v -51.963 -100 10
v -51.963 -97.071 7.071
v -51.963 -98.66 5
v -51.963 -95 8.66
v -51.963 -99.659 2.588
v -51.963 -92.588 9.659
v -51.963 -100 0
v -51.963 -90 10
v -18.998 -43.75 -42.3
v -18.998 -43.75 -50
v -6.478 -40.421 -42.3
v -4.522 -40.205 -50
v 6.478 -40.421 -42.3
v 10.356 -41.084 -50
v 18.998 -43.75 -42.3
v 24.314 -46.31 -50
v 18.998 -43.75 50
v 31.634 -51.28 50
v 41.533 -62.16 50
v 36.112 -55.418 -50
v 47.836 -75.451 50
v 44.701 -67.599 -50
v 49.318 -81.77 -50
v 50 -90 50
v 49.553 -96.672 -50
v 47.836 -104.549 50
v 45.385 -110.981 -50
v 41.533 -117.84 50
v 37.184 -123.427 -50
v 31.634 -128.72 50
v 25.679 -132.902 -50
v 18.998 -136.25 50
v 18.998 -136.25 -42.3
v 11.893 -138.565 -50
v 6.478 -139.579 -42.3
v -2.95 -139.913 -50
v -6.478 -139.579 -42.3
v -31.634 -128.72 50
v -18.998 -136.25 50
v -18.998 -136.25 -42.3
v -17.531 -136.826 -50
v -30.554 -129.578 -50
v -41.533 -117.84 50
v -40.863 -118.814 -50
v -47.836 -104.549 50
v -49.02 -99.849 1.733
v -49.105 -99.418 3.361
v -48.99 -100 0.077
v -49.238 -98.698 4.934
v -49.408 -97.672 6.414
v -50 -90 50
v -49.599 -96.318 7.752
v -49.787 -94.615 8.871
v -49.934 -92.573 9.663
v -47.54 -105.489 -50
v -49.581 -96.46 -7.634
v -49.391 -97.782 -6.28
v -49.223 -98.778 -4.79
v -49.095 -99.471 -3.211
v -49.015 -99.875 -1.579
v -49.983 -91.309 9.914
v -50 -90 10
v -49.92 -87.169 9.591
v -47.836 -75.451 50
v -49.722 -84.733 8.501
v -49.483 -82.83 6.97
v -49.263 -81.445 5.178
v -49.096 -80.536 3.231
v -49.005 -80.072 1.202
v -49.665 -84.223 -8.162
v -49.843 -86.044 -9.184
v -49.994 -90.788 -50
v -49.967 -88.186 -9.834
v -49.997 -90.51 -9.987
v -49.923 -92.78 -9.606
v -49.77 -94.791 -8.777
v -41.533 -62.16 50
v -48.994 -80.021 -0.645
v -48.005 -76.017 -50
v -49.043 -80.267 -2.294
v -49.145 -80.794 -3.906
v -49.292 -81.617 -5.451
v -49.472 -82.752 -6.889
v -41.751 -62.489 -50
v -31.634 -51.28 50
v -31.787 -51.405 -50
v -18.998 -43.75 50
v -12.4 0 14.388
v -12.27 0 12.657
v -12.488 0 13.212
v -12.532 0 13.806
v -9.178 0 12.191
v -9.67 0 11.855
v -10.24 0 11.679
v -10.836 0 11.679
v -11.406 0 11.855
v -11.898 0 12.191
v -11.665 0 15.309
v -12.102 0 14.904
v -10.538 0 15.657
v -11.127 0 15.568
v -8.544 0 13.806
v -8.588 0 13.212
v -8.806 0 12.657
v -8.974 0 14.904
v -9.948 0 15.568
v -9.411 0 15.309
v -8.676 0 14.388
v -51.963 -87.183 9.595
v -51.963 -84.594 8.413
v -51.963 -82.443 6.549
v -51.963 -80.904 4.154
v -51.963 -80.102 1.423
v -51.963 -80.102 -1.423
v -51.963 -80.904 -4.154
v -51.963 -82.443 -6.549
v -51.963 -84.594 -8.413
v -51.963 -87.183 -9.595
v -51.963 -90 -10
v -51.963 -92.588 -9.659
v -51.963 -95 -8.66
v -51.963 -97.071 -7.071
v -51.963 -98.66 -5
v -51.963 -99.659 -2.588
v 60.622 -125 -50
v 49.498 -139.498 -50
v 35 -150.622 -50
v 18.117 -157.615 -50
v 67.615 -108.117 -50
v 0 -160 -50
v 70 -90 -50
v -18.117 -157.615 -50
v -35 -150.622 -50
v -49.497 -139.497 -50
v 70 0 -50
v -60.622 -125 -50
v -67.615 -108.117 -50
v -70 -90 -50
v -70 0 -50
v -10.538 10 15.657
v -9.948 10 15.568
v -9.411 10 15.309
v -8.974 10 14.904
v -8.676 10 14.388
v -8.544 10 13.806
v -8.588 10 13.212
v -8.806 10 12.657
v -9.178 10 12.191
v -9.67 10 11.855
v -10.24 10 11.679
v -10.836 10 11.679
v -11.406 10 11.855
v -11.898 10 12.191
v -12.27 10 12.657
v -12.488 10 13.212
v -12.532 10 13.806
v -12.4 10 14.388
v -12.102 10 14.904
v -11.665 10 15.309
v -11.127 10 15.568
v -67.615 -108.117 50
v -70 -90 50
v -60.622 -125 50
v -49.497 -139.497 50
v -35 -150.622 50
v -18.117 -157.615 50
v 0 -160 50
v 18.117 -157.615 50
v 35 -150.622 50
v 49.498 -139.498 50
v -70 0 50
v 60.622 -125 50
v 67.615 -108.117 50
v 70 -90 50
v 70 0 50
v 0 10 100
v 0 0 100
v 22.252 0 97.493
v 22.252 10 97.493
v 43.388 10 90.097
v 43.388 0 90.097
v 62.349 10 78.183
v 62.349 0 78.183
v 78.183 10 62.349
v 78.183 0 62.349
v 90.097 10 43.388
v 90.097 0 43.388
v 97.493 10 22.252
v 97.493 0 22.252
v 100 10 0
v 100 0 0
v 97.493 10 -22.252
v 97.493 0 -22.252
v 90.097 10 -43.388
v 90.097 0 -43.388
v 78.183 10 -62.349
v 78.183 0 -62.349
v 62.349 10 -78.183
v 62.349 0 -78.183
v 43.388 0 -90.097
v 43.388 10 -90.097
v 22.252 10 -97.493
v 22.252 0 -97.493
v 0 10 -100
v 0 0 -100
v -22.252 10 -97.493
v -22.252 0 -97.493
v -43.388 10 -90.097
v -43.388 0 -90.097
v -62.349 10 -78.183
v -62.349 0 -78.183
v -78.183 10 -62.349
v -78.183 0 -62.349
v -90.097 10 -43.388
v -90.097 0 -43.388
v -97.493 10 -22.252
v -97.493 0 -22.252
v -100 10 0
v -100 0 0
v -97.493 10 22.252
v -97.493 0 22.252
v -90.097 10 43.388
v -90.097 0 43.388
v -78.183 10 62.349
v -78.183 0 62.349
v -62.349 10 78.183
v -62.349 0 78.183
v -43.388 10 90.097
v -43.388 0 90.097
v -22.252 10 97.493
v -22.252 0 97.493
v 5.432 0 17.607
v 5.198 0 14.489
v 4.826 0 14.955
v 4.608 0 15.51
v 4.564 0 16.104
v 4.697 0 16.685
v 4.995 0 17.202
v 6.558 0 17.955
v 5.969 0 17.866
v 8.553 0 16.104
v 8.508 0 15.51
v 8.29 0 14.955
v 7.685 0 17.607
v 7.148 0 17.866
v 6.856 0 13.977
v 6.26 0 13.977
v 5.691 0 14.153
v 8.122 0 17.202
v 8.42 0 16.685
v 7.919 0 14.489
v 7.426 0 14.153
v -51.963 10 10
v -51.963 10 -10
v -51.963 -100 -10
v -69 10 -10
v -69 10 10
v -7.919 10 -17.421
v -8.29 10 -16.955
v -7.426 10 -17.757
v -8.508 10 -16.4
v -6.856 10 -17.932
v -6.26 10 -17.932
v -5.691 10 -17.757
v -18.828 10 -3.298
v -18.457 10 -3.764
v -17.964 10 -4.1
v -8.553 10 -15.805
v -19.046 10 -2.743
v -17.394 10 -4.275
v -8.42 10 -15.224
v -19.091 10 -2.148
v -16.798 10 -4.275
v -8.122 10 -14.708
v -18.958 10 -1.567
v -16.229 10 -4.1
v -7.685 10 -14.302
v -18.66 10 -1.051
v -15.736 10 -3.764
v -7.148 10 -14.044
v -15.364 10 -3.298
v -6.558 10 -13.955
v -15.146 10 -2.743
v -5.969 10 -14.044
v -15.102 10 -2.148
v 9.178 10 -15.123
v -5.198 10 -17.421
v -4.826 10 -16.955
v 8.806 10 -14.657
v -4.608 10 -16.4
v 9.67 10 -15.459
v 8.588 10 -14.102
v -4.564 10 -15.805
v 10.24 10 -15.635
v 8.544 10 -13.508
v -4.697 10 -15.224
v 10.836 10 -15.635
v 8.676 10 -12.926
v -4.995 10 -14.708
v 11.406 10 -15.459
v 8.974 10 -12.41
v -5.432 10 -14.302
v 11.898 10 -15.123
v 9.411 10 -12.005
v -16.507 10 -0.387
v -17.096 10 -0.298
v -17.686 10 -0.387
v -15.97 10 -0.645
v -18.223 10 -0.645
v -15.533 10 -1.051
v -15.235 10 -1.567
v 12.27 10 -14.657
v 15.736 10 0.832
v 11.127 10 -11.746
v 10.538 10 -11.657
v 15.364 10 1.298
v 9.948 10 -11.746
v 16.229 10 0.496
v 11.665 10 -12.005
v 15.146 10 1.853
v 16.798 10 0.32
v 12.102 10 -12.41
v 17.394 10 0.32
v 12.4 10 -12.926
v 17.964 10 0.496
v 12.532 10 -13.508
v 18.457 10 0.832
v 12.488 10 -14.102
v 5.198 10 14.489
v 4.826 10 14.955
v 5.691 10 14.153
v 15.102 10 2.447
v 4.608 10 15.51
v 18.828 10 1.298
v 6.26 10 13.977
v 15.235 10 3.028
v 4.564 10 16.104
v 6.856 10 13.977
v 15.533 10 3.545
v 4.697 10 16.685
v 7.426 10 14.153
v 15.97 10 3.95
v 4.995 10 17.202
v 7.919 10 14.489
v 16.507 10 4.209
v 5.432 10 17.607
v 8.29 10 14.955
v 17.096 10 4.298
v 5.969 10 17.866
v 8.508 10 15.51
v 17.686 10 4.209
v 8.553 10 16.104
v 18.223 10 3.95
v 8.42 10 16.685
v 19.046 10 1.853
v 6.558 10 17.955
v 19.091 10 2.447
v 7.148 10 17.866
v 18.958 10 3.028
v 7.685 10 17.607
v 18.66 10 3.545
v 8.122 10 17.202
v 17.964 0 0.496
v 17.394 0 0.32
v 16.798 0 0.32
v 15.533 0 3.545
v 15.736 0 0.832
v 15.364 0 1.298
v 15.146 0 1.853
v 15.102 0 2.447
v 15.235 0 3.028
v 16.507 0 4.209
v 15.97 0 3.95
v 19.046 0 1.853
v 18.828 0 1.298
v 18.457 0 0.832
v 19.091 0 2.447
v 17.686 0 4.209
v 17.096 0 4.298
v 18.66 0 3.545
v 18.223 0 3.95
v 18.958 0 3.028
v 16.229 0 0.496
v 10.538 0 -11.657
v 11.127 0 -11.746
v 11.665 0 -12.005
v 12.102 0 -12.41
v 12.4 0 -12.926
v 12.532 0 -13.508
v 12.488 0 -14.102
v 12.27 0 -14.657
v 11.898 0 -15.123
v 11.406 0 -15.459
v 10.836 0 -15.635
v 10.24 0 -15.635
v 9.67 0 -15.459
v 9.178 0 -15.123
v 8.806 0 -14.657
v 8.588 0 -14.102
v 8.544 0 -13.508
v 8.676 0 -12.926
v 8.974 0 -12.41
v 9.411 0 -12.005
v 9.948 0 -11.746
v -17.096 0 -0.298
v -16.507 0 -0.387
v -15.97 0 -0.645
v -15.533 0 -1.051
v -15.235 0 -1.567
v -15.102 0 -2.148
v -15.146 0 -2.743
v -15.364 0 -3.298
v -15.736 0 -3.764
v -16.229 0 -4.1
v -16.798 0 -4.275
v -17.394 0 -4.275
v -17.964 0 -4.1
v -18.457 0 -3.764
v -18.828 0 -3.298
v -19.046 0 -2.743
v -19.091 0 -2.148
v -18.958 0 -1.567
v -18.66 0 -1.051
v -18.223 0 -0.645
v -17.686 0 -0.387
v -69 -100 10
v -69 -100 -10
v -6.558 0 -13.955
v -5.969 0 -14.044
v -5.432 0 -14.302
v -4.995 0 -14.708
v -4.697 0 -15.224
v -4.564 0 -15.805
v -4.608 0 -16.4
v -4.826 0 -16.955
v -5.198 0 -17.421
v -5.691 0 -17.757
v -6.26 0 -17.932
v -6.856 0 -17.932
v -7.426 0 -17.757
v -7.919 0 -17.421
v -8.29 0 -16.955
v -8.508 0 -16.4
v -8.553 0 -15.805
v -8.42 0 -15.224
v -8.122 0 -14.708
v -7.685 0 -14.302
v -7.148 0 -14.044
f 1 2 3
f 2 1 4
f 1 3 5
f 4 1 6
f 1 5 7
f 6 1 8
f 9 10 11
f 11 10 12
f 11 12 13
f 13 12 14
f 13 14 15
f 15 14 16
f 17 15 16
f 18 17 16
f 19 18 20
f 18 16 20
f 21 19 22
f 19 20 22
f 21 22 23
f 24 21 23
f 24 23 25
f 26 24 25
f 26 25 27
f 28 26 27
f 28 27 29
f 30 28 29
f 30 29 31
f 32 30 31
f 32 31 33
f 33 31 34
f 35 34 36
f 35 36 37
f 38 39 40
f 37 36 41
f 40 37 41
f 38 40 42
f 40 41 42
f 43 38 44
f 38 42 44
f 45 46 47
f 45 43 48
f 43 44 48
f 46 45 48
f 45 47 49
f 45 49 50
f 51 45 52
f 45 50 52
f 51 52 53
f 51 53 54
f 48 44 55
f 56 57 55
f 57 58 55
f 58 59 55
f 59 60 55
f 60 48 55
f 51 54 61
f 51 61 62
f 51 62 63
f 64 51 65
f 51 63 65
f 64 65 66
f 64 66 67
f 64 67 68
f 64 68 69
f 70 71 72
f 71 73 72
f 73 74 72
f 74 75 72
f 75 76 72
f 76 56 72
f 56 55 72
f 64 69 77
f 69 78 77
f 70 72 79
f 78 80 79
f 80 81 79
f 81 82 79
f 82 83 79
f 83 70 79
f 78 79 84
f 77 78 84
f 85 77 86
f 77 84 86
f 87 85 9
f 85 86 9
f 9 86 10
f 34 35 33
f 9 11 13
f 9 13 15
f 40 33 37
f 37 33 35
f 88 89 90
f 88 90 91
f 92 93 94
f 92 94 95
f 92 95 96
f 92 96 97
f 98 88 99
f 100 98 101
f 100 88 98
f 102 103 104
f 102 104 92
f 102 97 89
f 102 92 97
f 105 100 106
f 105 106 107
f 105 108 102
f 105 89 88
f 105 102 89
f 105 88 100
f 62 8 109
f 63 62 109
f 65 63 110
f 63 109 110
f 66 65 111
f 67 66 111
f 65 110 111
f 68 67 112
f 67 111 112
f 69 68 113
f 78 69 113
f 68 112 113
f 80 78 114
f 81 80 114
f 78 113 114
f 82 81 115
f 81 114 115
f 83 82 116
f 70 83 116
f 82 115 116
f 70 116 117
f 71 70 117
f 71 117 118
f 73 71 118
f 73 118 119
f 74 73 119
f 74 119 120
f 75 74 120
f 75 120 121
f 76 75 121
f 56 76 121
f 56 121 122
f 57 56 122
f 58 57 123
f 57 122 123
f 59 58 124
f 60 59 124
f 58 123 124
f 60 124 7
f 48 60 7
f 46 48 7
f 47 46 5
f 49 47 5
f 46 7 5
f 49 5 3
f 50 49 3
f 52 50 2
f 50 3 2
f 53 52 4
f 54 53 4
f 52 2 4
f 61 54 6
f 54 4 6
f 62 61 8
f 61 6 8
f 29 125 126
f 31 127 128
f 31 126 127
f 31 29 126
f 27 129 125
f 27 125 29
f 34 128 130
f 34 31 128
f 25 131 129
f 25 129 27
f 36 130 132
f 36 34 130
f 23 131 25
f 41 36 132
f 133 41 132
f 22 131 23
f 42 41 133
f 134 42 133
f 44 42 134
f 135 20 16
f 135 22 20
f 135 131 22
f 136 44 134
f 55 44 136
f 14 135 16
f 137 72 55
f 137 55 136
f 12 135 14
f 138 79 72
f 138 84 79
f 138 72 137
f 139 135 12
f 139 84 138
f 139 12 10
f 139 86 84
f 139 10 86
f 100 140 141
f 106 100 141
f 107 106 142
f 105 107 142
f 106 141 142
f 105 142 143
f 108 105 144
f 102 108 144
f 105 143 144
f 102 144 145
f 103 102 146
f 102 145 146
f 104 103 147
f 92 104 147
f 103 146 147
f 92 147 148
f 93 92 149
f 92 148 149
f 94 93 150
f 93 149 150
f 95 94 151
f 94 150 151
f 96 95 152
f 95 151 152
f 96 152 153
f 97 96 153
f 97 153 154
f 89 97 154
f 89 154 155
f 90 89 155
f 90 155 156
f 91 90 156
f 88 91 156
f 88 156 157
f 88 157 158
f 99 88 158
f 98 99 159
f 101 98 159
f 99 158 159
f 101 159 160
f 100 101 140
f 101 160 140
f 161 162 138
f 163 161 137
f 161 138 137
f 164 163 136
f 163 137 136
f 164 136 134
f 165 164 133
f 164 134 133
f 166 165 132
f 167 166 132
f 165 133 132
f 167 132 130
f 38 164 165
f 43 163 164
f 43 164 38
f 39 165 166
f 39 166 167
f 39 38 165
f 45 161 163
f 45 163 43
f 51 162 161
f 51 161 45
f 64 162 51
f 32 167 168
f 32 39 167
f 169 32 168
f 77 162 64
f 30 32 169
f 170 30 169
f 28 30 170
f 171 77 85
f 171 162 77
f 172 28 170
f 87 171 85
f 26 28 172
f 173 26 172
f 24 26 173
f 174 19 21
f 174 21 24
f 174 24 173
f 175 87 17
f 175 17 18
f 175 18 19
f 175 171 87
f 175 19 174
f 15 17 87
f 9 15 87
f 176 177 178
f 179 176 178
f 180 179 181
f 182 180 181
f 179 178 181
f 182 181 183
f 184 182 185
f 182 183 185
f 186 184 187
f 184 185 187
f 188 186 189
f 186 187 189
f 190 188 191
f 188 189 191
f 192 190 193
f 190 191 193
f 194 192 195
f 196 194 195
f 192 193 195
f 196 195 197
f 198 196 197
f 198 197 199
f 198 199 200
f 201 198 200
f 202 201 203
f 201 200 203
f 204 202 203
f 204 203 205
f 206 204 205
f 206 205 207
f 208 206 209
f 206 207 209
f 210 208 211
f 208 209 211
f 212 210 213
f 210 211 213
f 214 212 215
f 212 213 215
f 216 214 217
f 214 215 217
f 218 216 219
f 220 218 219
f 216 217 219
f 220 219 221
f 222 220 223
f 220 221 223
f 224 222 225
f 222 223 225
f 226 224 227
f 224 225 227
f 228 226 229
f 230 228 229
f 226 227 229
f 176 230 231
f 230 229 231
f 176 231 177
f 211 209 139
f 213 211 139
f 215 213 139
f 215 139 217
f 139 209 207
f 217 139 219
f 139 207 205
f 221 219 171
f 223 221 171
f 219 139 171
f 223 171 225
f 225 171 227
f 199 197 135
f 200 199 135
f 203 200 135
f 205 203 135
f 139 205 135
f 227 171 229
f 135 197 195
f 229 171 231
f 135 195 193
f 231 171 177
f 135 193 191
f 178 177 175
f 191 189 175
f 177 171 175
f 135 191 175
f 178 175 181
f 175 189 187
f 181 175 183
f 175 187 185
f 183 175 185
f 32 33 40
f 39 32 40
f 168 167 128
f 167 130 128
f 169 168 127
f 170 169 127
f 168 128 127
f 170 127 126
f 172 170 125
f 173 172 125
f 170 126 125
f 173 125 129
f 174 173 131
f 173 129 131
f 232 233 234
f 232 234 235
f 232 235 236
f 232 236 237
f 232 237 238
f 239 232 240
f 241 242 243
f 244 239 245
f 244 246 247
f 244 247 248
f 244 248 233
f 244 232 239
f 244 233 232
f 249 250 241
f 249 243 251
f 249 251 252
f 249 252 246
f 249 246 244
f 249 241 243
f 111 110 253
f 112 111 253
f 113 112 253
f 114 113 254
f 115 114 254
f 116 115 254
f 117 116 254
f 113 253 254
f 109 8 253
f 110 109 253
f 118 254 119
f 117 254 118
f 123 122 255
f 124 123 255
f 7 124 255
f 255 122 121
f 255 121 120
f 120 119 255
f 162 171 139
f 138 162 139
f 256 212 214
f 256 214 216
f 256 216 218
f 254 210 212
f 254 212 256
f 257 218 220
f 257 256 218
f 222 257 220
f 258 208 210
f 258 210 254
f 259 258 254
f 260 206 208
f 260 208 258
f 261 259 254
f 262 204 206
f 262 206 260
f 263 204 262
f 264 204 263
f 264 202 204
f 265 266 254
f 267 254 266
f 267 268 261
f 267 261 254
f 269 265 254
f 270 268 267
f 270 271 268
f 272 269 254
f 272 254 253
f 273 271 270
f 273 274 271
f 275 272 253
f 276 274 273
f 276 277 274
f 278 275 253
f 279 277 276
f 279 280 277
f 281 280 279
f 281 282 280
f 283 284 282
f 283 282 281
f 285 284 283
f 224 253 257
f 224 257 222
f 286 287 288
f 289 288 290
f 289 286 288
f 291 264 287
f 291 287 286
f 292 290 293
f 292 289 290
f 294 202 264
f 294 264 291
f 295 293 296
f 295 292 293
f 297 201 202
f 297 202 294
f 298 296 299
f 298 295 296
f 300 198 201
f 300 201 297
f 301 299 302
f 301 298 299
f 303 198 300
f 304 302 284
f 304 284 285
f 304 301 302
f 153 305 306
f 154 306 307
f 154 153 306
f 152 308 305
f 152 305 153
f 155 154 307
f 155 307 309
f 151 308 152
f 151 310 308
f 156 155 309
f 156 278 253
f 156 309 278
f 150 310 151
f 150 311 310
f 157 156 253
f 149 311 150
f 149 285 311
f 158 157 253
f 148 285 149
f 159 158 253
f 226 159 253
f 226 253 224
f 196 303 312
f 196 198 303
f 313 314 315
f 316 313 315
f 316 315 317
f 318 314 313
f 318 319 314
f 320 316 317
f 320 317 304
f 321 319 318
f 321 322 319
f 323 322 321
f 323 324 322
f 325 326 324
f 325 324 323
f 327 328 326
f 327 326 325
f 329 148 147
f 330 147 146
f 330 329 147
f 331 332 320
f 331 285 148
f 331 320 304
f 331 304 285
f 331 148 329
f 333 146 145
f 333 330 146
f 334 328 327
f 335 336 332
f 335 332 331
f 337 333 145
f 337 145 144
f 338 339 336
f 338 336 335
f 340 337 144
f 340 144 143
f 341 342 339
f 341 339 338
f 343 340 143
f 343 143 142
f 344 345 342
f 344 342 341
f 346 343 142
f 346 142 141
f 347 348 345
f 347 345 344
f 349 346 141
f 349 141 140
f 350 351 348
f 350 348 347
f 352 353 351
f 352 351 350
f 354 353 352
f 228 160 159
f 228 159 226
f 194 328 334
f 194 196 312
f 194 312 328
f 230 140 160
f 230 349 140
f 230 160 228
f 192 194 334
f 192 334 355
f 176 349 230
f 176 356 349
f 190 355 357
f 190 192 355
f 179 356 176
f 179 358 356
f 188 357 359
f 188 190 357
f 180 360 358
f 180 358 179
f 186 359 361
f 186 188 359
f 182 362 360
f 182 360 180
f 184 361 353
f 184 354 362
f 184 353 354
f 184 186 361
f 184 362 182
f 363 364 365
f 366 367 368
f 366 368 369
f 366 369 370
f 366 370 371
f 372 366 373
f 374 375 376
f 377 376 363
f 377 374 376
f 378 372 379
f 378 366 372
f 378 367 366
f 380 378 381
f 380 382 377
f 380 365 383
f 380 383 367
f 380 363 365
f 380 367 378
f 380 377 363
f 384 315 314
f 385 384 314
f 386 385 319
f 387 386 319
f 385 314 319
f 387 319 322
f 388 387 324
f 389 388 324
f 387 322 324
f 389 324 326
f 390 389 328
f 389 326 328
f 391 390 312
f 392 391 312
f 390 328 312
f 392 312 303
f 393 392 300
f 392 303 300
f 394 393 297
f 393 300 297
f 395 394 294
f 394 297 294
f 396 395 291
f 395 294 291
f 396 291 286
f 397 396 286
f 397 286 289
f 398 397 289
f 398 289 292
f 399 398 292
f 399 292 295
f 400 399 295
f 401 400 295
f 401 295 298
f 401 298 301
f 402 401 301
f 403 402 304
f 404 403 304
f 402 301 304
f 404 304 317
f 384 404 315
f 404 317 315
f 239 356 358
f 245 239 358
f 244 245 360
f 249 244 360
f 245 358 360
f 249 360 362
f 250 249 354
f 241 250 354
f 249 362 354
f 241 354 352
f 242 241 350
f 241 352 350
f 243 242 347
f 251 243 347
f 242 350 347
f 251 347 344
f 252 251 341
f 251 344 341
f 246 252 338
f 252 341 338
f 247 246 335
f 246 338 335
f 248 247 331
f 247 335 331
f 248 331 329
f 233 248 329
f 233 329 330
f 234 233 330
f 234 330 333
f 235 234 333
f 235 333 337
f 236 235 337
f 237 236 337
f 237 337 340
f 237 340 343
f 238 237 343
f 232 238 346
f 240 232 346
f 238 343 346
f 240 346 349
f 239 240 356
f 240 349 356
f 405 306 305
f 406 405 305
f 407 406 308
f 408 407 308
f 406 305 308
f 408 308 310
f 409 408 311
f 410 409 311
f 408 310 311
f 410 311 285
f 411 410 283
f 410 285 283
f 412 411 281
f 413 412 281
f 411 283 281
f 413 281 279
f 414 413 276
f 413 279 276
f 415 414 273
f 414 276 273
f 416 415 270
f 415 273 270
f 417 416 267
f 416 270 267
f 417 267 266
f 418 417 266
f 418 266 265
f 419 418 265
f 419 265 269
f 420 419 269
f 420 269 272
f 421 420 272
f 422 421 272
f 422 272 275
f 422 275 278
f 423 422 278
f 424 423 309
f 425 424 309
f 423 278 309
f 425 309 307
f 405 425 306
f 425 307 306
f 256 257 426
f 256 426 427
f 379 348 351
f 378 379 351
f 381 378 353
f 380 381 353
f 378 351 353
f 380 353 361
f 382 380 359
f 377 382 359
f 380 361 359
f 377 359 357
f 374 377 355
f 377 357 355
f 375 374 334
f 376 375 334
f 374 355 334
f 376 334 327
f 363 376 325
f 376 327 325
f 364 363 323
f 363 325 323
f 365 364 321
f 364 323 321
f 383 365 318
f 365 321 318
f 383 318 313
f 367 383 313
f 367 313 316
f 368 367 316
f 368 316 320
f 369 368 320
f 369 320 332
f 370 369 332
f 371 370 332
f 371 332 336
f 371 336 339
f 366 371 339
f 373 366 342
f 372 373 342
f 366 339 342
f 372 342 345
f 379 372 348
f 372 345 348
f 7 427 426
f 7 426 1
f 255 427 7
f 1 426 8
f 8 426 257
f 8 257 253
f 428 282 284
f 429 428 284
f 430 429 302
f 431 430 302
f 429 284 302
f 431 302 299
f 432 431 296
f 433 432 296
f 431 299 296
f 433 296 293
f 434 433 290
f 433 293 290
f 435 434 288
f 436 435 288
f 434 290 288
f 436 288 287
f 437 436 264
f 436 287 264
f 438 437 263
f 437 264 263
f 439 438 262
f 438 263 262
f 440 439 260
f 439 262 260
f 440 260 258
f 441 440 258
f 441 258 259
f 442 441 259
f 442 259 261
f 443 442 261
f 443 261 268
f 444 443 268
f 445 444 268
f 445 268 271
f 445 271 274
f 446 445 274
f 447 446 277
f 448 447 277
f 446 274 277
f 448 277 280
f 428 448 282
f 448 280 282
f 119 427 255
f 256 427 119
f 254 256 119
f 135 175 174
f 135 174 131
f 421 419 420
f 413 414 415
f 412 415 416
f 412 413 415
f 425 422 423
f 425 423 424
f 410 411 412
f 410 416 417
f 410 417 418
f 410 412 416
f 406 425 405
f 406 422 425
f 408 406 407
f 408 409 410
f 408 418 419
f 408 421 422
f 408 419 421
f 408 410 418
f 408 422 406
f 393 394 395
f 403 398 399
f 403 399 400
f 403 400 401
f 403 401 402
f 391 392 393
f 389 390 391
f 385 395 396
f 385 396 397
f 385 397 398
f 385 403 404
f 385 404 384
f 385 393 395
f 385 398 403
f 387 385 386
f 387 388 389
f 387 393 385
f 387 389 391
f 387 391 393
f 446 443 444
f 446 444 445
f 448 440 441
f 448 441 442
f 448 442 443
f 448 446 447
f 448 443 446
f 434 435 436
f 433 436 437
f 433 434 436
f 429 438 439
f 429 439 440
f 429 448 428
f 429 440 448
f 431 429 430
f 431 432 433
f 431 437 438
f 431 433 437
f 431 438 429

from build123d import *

# Parameters (mm, degrees)
SKETCH_1_R          = 100
EXTRUDE_1_DEPTH     = 10
SKETCH_2_W          = 140
SKETCH_2_H          = 100
EXTRUDE_2_DEPTH     = 160.00000000000009
FILLET_1_R          = 70
FILLET_2_R          = 70
SKETCH_3_R          = 50
CUT_EXTRUDE_1_DEPTH = 160.00000000000009
CUT_EXTRUDE_START   = -1
SKETCH_13_R         = 9.999999999999998
CUT_EXTRUDE_5_DEPTH = 25
SKETCH_9_W          = 53.30531277978001
SKETCH_9_H          = 9.28529014360771
EXTRUDE_3_DEPTH     = 100
SKETCH_14_R         = 50
CUT_EXTRUDE_6_DEPTH = 7.7
SKETCH_15_W         = 17.036633895131082
SKETCH_15_H         = 20
CUT_EXTRUDE_7_DEPTH = 110.00000000000001
SKETCH_16_R         = 2.0000000000000036
SKETCH_16_R_2       = 2.000000000000005
SKETCH_16_R_3       = 2.0000000000000013
SKETCH_16_R_4       = 2.0000000000000027
SKETCH_16_R_5       = 2.0000000000000044
CUT_EXTRUDE_8_DEPTH = 10


with BuildPart() as part:
    # 草图1 → 凸台-拉伸1 (new body)
    with BuildSketch(Plane(origin=(0, 0, 0), x_dir=(1, 0, 0), z_dir=(0, 1, 0))):
        with Locations(Location((0, 0, 0), (0, 0, 270))):
            Circle(SKETCH_1_R)
    extrude(amount=EXTRUDE_1_DEPTH)

    # 草图2 → 凸台-拉伸2 (add)
    with BuildSketch(Plane(origin=(0, 0, 0), x_dir=(1, 0, 0), z_dir=(0, 1, 0))):
        Rectangle(SKETCH_2_W, SKETCH_2_H)
    extrude(amount=-EXTRUDE_2_DEPTH)

    # 圆角1
    fillet_1_edges = [part.edges().sort_by_distance(p)[0] for p in [
        (-70.00000000000001, -160.00000000000009, 7.11e-15),
    ]]
    fillet(fillet_1_edges, radius=FILLET_1_R)

    # 圆角2
    fillet_2_edges = [part.edges().sort_by_distance(p)[0] for p in [
        (69.99999999999999, -160.00000000000009, 7.11e-15),
    ]]
    fillet(fillet_2_edges, radius=FILLET_2_R - 0.0001)  # a hair under: the kernel refuses the full size

    # 草图3 → 切除-拉伸1 (cut)
    with BuildSketch(Plane(origin=(0, 0, -49.99999999999999), x_dir=(-1, 0, 0), z_dir=(0, 0, -1))):
        with Locations((0, -90)):
            Circle(SKETCH_3_R)
    extrude(amount=-CUT_EXTRUDE_1_DEPTH, mode=Mode.SUBTRACT)

    # 草图13 → 切除-拉伸5 (cut)
    with BuildSketch(Plane.ZY.offset(70.00000000000001).offset(CUT_EXTRUDE_START)):
        with Locations((6.94e-15, -90.00000000000009)):
            Circle(SKETCH_13_R)
    extrude(amount=-CUT_EXTRUDE_5_DEPTH, mode=Mode.SUBTRACT)

    # 草图9 → 凸台-拉伸3 (add)
    with BuildSketch(Plane(origin=(0, 0, -49.99999999999999), x_dir=(-1, 0, 0), z_dir=(0, 0, -1))):
        with Locations((0.3436291461197136, -140.89264507180383)):
            Rectangle(SKETCH_9_W, SKETCH_9_H)
        Polygon((-23.87404930056264, -43.75), (22.298543315194763, -43.75), (22.298543315194763, -37.81707315136096), (-23.87404930056264, -37.817073151360965), align=None)
    extrude(amount=-EXTRUDE_3_DEPTH)

    # 草图14 → 切除-拉伸6 (cut)
    with BuildSketch(Plane(origin=(0, 0, -49.99999999999999), x_dir=(-1, 0, 0), z_dir=(0, 0, -1))):
        with Locations((0, -90)):
            Circle(SKETCH_14_R)
    extrude(amount=-CUT_EXTRUDE_6_DEPTH, mode=Mode.SUBTRACT)

    # 草图15 → 切除-拉伸7 (cut)
    with BuildSketch(Plane(origin=(0, 10, 0), x_dir=(1, 0, 0), z_dir=(0, 1, 0))):
        with Locations((-60.48168305243448, -7.11e-15)):
            Rectangle(SKETCH_15_W, SKETCH_15_H)
    extrude(amount=-CUT_EXTRUDE_7_DEPTH, mode=Mode.SUBTRACT)

    # 草图16 → 切除-拉伸8 (cut)
    with BuildSketch(Plane(origin=(0, 10, 0), x_dir=(1, 0, 0), z_dir=(0, 1, 0))):
        with Locations(Location((10.537986720028217, 13.656988536588477, 0), (0, 0, 270))):
            Circle(SKETCH_16_R)
        with Locations(Location((17.09629237189259, -2.2976699359932877, 0), (0, 0, 270))):
            Circle(SKETCH_16_R_2)
        with Locations(Location((6.558305651864305, -15.954658472581762, 0), (0, 0, 270))):
            Circle(SKETCH_16_R_3)
        with Locations(Location((-10.537986720028309, -13.656988536588404, 0), (0, 0, 270))):
            Circle(SKETCH_16_R_4)
        with Locations(Location((-17.09629237189257, 2.2976699359934125, 0), (0, 0, 270))):
            Circle(SKETCH_16_R_4)
        with Locations(Location((-6.558305651864193, 15.954658472581803, 0), (0, 0, 270))):
            Circle(SKETCH_16_R_5)
    extrude(amount=-CUT_EXTRUDE_8_DEPTH, mode=Mode.SUBTRACT)


solid = part.part
